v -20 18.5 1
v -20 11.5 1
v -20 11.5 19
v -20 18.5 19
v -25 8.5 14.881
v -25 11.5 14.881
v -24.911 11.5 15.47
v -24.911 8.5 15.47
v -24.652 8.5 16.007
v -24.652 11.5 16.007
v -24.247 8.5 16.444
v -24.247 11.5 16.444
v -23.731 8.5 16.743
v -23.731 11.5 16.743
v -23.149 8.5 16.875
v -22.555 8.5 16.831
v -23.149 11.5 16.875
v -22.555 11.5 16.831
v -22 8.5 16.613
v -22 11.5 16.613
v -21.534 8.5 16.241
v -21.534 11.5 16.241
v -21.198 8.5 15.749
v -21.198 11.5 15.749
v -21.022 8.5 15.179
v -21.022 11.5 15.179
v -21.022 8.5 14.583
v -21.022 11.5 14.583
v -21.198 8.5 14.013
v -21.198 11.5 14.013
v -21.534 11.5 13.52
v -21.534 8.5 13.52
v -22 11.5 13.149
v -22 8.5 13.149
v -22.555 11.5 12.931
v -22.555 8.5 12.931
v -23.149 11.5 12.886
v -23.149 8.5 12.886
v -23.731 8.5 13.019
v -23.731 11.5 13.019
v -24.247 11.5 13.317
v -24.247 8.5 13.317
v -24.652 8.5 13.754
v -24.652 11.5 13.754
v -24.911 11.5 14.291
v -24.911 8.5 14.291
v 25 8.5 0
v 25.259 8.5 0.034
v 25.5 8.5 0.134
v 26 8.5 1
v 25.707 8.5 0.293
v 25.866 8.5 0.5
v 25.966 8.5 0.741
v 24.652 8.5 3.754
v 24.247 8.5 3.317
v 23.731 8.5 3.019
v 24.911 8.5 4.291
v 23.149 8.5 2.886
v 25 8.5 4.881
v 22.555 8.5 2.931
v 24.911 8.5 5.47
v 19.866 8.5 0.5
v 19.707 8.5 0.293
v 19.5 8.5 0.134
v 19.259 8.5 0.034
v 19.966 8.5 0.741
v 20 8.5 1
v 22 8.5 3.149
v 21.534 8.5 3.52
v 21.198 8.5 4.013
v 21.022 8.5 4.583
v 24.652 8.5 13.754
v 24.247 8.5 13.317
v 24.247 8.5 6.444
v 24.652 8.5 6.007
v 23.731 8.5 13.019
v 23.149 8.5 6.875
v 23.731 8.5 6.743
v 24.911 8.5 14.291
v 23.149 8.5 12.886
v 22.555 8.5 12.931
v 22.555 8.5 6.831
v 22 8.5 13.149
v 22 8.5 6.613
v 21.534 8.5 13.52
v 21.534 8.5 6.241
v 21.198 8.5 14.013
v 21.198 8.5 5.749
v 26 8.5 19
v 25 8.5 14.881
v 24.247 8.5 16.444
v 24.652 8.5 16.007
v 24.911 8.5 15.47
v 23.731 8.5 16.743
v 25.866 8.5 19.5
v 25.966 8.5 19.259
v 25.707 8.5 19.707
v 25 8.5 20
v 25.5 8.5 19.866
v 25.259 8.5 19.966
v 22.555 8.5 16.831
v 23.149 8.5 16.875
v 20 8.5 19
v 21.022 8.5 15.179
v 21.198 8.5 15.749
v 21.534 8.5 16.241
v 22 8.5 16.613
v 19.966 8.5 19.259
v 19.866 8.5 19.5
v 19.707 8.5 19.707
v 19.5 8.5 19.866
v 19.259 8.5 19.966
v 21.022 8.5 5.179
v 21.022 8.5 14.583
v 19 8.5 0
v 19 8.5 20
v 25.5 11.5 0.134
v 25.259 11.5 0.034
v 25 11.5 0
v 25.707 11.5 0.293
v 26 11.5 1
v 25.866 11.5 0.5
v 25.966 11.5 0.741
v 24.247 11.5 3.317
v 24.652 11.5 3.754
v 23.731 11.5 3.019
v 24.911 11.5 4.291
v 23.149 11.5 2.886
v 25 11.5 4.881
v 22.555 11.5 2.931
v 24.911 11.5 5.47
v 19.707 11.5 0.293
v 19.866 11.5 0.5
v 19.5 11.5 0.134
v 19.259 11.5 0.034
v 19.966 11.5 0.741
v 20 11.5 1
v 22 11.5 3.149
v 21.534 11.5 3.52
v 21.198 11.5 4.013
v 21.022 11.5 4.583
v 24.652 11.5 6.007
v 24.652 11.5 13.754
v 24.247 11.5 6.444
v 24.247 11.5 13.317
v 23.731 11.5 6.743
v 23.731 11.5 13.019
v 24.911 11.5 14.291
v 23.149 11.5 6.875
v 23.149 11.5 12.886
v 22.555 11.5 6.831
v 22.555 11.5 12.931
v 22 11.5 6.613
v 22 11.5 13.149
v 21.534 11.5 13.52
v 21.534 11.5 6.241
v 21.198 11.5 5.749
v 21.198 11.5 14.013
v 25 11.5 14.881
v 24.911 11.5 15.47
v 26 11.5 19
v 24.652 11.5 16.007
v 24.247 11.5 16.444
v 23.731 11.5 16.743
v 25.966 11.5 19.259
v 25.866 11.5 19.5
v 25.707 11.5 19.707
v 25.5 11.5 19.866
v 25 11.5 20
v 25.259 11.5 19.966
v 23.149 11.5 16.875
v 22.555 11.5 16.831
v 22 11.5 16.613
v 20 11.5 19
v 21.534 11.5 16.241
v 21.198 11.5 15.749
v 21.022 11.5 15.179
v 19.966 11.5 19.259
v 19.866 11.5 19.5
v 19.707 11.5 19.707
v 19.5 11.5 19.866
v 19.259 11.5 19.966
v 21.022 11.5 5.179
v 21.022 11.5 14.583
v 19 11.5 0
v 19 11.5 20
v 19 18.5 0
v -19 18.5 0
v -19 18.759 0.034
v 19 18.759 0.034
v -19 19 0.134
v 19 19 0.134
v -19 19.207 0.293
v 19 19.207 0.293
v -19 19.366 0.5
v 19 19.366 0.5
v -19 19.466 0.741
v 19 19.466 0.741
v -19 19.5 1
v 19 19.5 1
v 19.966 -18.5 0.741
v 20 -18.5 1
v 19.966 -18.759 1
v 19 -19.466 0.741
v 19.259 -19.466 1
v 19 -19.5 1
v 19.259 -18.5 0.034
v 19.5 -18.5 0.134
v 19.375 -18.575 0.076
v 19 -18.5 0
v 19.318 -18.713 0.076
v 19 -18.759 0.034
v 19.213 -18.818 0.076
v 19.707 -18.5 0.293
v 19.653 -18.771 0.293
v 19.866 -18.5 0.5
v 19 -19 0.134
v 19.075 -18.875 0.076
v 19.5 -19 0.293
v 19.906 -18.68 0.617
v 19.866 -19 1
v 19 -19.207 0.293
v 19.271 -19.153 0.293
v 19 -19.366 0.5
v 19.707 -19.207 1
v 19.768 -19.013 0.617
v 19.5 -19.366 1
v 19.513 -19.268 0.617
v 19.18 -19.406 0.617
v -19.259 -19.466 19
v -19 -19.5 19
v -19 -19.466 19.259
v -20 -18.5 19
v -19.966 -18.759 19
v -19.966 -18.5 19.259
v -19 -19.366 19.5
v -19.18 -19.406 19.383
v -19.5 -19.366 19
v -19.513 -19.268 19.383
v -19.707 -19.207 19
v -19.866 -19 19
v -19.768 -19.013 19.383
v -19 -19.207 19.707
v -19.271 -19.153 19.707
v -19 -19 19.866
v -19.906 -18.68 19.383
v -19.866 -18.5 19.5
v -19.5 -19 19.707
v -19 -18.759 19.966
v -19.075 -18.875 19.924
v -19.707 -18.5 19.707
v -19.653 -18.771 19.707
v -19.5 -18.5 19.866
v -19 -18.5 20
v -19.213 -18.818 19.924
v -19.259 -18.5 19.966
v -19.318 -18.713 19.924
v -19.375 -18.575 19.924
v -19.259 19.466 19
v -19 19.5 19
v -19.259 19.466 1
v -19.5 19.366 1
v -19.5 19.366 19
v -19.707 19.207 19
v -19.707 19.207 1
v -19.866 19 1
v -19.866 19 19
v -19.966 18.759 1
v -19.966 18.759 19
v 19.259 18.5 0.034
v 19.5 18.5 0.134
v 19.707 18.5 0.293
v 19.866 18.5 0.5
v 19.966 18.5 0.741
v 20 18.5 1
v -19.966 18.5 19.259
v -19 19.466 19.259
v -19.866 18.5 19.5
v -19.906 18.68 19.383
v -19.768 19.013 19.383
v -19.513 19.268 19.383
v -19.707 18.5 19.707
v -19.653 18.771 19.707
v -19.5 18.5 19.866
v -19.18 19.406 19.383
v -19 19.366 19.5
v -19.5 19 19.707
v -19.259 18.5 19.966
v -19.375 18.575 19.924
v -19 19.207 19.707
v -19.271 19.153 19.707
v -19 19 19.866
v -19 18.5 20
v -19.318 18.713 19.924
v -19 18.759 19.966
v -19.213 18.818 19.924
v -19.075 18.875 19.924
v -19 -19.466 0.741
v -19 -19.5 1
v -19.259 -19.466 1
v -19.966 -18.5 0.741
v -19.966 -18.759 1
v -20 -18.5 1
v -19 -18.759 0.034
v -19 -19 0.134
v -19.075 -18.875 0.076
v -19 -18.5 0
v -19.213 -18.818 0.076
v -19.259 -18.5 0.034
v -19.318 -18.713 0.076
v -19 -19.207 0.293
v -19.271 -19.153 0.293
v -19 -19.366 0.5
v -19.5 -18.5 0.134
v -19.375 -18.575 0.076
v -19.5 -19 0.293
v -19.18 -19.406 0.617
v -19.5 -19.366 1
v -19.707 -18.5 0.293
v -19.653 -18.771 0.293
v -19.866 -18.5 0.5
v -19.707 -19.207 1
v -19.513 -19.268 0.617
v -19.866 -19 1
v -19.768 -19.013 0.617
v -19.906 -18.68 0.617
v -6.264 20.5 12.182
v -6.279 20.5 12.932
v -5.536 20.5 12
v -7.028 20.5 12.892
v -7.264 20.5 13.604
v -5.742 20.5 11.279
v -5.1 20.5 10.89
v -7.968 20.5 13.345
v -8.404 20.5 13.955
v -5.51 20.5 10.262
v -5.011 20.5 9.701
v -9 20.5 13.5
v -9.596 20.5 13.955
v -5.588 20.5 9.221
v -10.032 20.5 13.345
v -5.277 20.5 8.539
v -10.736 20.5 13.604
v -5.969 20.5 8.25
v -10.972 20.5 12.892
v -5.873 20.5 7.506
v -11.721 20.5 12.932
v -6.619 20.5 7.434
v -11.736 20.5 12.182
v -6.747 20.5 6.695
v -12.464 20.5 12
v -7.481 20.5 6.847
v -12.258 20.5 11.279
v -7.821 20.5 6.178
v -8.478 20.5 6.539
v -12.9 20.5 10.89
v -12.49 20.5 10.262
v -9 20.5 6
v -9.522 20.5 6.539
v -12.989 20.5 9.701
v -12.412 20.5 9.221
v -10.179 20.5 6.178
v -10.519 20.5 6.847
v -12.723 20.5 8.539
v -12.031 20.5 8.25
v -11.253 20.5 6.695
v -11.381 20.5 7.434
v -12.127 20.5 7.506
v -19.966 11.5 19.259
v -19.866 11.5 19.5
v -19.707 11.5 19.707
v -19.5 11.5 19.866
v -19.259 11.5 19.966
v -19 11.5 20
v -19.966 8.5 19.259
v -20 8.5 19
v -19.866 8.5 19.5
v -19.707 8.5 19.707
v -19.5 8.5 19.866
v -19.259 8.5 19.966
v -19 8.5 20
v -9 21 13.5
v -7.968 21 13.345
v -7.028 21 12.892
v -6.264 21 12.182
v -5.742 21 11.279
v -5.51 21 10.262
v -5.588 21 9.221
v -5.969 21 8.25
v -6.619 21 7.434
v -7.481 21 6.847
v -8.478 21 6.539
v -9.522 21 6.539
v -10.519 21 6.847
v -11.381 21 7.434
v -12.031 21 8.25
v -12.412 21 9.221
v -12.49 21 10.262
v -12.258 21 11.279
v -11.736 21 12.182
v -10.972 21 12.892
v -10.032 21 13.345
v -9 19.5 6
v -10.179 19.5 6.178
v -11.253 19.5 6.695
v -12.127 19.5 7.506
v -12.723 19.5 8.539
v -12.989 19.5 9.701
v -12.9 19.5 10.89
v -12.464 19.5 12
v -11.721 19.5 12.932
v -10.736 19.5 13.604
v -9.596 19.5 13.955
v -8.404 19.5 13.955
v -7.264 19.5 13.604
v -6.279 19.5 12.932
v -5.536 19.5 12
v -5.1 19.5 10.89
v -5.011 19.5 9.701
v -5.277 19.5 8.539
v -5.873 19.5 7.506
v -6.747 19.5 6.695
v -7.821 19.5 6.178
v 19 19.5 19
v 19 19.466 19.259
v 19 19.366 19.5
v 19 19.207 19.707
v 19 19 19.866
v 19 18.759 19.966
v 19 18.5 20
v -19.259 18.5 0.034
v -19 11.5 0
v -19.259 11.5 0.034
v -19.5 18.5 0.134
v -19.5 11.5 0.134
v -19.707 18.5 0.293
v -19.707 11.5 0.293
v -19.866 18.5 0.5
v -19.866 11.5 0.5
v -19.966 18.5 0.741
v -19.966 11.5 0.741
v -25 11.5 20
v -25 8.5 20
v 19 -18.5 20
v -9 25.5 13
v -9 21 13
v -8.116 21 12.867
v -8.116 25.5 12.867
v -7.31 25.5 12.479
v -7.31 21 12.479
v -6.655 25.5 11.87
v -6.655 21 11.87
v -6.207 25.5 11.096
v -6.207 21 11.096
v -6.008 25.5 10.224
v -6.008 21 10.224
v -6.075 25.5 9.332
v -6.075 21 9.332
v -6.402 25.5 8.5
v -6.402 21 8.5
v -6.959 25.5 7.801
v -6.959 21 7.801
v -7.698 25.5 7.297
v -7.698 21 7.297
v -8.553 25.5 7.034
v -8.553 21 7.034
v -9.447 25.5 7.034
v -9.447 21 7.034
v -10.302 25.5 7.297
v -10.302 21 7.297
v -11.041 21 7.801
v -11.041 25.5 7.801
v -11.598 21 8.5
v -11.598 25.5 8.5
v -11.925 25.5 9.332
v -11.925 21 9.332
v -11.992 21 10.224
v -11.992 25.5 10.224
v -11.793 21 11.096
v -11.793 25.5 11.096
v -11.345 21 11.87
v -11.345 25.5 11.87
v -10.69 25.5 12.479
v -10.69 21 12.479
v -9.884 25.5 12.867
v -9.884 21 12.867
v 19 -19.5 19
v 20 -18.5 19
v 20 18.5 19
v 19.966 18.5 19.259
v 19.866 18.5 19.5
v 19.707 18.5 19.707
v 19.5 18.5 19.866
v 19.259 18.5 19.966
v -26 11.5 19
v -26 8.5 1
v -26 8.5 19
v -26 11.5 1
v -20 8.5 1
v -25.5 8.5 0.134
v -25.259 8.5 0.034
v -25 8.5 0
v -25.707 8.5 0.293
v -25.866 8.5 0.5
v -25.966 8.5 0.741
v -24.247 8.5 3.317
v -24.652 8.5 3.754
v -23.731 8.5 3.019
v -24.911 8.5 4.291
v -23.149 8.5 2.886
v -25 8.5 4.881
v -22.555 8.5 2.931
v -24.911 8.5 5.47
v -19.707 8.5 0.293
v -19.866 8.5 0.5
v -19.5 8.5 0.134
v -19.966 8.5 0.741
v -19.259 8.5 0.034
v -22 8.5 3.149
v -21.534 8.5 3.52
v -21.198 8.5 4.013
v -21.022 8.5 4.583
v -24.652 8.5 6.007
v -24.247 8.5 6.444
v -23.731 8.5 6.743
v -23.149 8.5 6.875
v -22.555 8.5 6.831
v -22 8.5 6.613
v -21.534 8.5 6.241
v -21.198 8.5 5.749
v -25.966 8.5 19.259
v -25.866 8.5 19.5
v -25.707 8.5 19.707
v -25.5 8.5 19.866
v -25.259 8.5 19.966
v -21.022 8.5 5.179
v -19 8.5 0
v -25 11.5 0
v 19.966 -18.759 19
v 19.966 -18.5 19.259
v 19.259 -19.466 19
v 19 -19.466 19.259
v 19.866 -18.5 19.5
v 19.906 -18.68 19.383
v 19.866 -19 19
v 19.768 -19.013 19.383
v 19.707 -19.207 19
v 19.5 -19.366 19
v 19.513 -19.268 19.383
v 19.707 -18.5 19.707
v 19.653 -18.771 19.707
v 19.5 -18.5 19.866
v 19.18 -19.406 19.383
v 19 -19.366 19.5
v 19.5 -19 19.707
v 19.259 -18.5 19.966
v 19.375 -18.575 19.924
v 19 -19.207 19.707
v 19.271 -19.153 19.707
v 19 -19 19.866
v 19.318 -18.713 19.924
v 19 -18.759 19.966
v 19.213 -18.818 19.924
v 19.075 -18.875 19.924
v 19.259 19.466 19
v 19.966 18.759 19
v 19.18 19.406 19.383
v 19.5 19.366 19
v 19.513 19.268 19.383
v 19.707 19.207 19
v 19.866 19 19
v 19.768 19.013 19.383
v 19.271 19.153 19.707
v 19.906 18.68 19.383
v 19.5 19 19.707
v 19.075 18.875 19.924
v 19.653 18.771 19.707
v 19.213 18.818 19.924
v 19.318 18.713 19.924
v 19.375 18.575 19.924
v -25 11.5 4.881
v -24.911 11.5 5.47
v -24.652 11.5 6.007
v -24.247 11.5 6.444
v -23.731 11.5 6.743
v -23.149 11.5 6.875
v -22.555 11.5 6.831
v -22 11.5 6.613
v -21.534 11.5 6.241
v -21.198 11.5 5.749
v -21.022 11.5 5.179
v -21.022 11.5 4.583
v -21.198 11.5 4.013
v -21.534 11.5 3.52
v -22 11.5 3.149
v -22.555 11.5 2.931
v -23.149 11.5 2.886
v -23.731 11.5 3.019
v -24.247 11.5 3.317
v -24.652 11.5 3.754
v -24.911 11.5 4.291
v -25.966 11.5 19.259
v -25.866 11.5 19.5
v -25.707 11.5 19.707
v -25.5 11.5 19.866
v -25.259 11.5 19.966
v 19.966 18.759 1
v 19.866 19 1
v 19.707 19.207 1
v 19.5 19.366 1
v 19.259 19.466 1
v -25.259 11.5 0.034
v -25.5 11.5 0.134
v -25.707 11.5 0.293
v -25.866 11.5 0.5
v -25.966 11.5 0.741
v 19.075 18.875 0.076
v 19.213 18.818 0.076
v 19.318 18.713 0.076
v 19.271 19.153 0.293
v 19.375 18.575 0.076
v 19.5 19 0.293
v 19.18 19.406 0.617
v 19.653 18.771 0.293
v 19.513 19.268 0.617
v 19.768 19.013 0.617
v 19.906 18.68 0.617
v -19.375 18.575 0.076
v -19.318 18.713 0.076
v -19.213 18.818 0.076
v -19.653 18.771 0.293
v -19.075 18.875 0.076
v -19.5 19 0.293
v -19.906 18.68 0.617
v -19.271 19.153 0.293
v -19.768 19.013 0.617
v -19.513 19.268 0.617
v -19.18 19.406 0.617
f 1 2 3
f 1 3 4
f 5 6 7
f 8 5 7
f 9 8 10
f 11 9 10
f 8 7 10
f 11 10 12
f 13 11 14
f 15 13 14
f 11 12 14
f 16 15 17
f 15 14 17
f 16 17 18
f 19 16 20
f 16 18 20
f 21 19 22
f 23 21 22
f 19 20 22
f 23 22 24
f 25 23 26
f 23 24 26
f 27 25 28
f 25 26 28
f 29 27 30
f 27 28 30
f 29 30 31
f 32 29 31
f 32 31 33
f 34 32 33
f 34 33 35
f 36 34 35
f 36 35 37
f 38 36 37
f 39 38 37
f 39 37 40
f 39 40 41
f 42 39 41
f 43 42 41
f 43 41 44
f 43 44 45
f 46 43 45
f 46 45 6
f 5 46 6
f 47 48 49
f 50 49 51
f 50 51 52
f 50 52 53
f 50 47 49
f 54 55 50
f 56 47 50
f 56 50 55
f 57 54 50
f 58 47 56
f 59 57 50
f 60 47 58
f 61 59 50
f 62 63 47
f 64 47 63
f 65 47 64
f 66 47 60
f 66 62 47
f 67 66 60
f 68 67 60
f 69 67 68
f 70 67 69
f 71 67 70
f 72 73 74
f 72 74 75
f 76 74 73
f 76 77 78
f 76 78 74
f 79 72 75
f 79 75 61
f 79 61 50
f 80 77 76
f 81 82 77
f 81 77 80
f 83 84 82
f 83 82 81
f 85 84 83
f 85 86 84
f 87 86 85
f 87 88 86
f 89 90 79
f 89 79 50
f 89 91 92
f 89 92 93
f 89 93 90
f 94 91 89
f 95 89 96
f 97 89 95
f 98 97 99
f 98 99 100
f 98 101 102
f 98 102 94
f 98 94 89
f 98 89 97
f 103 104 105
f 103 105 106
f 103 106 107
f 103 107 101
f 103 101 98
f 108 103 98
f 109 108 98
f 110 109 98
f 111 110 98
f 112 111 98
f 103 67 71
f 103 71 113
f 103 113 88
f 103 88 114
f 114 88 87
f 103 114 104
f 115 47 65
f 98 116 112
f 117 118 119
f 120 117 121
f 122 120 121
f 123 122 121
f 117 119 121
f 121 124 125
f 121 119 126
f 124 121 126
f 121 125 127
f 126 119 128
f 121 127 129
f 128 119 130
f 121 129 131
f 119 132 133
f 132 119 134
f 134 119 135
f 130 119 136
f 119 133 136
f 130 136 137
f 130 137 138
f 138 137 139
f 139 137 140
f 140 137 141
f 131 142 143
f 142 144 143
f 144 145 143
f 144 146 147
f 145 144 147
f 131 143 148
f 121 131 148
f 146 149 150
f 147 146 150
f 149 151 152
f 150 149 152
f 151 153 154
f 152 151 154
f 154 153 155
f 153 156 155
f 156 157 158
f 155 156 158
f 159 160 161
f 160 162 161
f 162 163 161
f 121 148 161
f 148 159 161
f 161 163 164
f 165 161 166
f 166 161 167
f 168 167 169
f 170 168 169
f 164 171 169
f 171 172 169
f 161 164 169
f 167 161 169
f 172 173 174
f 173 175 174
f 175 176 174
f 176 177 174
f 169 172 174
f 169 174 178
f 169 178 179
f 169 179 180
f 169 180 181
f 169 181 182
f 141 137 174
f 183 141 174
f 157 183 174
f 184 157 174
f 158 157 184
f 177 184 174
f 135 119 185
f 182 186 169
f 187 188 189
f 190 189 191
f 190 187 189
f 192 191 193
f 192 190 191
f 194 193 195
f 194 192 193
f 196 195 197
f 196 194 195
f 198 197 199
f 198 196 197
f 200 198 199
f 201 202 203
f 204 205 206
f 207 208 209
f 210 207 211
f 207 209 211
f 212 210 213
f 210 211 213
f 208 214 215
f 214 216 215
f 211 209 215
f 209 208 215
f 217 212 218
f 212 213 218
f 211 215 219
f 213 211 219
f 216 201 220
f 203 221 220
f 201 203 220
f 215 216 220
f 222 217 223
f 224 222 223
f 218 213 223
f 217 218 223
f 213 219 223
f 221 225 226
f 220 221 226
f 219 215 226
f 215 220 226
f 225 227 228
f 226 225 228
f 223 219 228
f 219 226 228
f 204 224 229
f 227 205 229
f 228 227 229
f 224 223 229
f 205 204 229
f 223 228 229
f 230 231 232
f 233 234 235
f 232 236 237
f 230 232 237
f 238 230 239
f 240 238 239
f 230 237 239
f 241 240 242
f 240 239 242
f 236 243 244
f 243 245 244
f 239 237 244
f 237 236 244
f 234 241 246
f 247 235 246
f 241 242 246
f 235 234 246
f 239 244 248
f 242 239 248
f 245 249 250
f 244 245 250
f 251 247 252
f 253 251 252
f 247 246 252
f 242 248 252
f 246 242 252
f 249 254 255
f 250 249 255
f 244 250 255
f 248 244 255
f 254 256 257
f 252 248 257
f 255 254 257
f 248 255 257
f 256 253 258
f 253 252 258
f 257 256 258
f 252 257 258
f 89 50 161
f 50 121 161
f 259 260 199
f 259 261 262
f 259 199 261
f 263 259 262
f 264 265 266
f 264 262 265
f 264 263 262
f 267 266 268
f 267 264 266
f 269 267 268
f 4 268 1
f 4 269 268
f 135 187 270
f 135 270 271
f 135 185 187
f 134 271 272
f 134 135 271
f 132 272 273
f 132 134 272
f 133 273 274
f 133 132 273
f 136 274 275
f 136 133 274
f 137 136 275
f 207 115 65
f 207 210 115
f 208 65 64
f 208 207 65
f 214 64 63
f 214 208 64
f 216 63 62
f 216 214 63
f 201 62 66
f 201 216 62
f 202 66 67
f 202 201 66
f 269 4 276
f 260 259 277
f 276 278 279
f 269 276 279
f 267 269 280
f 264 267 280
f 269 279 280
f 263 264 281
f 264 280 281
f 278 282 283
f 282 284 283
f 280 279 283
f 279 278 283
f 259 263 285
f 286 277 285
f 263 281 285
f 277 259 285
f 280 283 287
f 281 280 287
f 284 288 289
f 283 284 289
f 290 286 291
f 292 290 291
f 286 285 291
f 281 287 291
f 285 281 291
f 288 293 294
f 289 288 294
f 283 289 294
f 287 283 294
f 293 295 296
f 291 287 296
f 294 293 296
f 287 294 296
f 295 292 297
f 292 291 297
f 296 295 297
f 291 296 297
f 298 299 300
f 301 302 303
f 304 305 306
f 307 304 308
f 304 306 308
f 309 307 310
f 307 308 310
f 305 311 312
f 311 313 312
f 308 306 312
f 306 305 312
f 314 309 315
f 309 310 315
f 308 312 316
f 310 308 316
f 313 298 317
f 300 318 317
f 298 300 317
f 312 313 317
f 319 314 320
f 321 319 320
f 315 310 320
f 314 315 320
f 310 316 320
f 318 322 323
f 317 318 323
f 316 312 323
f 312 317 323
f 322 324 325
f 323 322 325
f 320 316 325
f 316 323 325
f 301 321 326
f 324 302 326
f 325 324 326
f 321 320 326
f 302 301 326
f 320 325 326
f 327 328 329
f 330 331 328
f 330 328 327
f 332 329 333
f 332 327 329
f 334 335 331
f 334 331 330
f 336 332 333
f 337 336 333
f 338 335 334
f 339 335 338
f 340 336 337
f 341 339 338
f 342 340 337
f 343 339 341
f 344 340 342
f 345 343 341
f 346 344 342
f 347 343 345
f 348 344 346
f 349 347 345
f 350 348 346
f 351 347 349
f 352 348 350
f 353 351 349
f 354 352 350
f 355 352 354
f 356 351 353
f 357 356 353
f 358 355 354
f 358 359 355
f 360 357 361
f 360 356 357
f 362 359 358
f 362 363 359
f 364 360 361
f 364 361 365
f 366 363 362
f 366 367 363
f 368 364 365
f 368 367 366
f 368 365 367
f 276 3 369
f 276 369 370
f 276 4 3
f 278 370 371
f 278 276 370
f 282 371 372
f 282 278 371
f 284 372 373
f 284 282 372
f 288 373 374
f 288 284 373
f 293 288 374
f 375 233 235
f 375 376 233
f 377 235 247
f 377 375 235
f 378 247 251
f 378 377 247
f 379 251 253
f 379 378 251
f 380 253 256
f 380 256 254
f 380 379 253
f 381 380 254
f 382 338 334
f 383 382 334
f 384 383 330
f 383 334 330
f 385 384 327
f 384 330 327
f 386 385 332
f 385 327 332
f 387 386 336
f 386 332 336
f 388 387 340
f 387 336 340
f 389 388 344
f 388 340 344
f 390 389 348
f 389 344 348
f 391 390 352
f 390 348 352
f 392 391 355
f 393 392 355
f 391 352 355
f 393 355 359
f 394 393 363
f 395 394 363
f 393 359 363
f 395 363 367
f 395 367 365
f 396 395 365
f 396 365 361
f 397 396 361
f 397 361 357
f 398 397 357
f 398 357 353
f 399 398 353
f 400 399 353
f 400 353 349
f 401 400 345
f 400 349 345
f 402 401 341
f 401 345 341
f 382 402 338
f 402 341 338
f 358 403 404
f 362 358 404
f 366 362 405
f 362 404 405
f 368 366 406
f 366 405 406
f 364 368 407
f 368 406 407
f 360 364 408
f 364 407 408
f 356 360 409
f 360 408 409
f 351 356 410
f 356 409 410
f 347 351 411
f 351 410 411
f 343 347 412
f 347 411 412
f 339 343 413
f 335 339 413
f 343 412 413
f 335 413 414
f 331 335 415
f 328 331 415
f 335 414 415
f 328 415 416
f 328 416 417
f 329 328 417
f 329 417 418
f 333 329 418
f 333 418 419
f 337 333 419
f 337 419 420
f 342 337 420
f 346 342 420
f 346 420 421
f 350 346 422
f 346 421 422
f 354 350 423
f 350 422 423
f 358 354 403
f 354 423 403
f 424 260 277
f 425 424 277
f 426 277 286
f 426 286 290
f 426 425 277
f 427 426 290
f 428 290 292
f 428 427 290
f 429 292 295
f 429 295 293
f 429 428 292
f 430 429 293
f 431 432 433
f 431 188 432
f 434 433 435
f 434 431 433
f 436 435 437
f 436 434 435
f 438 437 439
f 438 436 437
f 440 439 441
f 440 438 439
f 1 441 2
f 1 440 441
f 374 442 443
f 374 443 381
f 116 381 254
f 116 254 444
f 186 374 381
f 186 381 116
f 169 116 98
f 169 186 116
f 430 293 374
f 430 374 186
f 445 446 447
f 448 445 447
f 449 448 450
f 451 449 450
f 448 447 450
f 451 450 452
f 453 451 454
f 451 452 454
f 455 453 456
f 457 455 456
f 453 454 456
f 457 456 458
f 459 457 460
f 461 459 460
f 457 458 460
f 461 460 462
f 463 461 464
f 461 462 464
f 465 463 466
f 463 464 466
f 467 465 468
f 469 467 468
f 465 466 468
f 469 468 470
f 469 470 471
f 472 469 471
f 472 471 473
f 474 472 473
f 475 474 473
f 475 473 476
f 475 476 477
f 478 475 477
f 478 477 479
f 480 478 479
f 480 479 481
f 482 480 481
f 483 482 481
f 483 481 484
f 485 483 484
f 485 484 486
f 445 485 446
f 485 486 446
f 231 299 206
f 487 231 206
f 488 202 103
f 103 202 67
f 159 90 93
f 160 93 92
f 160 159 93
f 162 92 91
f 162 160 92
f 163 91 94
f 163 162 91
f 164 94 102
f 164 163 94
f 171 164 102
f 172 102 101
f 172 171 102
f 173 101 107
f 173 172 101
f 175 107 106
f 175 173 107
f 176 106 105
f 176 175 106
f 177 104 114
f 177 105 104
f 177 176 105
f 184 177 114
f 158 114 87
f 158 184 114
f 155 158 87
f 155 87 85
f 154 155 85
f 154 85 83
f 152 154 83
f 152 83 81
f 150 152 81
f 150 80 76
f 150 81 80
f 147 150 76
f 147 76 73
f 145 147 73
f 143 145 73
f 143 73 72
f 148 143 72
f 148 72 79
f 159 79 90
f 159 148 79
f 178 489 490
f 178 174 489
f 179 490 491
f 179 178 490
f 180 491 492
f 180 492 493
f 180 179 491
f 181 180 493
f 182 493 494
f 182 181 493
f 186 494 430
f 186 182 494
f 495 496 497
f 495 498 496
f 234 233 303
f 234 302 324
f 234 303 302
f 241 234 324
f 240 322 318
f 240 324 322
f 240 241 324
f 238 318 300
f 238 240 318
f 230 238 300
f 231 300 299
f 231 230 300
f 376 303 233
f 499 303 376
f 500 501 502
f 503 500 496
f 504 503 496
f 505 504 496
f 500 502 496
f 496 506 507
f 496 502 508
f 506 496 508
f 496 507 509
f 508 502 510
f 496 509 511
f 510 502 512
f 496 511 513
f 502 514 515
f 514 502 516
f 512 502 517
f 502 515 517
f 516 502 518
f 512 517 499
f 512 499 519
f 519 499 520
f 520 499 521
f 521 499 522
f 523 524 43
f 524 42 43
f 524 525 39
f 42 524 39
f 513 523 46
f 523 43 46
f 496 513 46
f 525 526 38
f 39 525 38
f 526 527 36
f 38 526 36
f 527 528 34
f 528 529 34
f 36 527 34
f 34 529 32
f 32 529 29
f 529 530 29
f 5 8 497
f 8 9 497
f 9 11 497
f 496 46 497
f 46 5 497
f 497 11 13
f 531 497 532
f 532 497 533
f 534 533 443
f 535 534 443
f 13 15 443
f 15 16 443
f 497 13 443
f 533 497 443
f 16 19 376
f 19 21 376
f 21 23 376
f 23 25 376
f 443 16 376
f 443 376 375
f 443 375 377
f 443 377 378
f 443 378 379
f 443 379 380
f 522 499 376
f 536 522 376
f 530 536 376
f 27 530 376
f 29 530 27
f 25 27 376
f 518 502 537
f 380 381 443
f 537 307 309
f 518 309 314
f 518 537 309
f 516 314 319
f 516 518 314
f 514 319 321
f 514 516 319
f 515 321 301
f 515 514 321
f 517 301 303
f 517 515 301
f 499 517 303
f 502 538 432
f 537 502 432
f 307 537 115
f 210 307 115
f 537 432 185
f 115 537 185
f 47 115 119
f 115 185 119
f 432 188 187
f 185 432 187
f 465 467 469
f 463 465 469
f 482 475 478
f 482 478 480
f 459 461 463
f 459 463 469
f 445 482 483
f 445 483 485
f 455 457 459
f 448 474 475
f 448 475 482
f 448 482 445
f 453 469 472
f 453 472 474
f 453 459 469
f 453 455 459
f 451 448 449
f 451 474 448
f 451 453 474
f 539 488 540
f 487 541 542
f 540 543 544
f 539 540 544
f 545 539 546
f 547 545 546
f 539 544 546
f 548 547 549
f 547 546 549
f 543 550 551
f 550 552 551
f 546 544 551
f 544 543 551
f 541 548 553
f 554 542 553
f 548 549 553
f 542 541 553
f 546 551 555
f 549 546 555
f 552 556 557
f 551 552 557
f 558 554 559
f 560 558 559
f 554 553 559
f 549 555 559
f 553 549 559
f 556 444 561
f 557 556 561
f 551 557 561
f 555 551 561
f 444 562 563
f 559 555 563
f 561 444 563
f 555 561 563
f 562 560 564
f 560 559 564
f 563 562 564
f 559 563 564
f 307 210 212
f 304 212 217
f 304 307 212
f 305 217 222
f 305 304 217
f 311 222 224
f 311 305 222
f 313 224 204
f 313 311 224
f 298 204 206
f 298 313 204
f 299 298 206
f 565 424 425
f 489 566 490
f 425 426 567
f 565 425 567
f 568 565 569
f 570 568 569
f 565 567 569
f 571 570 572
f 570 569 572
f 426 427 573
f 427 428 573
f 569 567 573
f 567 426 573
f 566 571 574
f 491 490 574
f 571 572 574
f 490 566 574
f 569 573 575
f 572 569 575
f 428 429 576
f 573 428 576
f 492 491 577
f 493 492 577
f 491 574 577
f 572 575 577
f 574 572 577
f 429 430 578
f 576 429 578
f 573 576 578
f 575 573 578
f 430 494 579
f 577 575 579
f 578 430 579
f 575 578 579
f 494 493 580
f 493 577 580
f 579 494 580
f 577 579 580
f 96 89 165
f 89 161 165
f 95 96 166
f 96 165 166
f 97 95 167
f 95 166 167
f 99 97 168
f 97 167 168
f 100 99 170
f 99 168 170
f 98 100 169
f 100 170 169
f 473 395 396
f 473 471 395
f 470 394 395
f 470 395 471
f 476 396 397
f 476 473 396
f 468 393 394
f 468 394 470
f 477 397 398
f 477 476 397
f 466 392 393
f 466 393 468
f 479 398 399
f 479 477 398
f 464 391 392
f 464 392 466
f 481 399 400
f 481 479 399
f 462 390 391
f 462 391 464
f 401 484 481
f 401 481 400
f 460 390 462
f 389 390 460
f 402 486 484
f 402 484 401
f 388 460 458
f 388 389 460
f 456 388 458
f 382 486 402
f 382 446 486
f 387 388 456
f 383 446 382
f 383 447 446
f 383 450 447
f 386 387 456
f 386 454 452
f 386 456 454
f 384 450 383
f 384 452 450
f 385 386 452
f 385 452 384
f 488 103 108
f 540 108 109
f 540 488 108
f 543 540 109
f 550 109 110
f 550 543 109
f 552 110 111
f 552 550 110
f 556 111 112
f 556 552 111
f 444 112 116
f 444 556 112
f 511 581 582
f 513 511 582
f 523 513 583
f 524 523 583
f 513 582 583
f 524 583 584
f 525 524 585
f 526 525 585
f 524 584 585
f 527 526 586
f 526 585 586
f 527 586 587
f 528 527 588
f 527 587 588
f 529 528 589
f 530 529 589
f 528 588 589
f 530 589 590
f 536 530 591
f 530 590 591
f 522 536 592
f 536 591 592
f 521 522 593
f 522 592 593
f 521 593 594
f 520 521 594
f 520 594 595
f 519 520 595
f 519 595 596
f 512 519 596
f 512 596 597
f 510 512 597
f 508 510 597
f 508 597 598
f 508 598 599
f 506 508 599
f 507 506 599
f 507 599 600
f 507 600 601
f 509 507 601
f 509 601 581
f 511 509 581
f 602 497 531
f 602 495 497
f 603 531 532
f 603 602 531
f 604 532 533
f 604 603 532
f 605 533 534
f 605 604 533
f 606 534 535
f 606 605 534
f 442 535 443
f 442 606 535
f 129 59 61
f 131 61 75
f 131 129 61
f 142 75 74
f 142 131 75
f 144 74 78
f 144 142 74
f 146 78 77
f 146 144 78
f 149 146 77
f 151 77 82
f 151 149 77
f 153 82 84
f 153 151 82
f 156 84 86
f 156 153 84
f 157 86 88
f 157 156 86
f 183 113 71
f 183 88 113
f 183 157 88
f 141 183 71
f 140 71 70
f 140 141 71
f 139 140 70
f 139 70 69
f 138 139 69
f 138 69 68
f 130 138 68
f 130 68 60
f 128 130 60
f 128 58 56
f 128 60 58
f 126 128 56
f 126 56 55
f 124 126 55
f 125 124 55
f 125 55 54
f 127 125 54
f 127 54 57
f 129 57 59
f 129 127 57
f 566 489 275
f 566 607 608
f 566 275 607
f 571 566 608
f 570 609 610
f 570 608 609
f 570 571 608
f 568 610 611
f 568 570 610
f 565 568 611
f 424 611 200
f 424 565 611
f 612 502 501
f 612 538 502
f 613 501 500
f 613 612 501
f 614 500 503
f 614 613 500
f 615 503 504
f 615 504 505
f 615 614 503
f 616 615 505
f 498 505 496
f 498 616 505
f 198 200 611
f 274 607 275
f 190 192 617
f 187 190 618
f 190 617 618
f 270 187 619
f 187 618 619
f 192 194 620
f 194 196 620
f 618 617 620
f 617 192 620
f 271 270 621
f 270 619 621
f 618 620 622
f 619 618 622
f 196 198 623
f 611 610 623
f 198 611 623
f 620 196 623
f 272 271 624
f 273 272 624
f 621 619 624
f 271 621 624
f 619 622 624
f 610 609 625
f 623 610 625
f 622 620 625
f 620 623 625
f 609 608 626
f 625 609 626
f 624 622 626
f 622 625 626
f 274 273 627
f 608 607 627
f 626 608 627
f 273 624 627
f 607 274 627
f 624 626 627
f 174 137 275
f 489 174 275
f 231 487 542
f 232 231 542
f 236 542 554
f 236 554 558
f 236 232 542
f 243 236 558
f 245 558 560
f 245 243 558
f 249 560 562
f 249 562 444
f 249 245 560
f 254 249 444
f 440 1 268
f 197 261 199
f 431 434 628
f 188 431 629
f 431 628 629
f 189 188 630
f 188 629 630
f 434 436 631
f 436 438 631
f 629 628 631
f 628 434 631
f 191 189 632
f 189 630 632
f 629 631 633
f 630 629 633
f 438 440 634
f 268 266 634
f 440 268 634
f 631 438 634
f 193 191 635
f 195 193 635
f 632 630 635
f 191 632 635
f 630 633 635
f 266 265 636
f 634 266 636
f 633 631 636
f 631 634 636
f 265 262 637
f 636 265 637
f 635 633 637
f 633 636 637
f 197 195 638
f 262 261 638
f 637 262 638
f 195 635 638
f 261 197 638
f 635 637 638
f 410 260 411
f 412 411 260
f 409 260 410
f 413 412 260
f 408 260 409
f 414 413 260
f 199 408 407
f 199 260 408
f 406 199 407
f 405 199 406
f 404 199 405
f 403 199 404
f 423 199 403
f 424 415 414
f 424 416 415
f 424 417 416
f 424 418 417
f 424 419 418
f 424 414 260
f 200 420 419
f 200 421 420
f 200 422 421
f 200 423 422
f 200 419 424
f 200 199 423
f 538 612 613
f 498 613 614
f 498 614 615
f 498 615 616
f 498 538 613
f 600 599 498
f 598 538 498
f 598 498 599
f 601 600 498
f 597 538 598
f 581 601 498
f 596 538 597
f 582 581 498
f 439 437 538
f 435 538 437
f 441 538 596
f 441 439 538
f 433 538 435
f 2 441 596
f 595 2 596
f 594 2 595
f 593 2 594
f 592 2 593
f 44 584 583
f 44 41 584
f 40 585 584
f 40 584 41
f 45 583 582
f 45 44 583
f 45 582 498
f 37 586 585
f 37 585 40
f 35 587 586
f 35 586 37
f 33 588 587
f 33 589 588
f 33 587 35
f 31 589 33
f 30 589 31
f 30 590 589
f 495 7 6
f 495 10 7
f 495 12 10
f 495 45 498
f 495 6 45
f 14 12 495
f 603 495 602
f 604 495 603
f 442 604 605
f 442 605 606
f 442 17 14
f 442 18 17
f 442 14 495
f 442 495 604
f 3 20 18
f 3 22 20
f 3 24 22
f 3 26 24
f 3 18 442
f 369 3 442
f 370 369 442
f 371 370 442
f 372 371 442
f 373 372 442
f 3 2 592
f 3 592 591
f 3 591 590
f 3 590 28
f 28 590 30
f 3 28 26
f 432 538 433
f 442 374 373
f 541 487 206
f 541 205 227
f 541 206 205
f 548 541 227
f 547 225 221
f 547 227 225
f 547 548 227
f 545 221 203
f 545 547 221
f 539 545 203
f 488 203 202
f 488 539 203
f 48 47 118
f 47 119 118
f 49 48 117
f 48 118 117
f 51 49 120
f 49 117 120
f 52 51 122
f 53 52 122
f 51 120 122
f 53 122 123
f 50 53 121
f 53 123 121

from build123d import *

# Parameters (mm, degrees)
SKETCH_2_W          = 40
SKETCH_2_H          = 39
EXTRUDE_1_DEPTH     = 20
SKETCH_3_R          = 4
EXTRUDE_2_DEPTH     = 1
SKETCH_4_R          = 3.5
EXTRUDE_3_DEPTH     = 0.5
SKETCH_6_R          = 3
EXTRUDE_4_DEPTH     = 4.5
SKETCH_7_W          = 20
SKETCH_7_H          = 3
EXTRUDE_5_DEPTH     = 6
SKETCH_8_R          = 2
CUT_EXTRUDE_1_DEPTH = 6
FILLET_6_R          = 1
FILLET_7_R          = 1
FILLET_8_R          = 1
FILLET_9_R          = 1
FILLET_10_R         = 1
FILLET_11_R         = 1
FILLET_12_R         = 1


with BuildPart() as part:
    # 草图2 → 凸台-拉伸1 (new body)
    with BuildSketch(Plane.XY):
        Rectangle(SKETCH_2_W, SKETCH_2_H)
    extrude(amount=EXTRUDE_1_DEPTH)

    # 草图3 → 凸台-拉伸2 (add)
    with BuildSketch(Plane(origin=(0, 19.5, 0), x_dir=(1, 0, 0), z_dir=(0, 1, 0))):
        with Locations(Location((-9, -10, 0), (0, 0, 90))):
            Circle(SKETCH_3_R)
    extrude(amount=EXTRUDE_2_DEPTH)

    # 草图4 → 凸台-拉伸3 (add)
    with BuildSketch(Plane(origin=(0, 20.5, 0), x_dir=(1, 0, 0), z_dir=(0, 1, 0))):
        with Locations(Location((-9, -10, 0), (0, 0, 270))):
            Circle(SKETCH_4_R)
    extrude(amount=EXTRUDE_3_DEPTH)

    # 草图6 → 凸台-拉伸4 (add)
    with BuildSketch(Plane(origin=(0, 21, 0), x_dir=(1, 0, 0), z_dir=(0, 1, 0))):
        with Locations(Location((-9, -10, 0), (0, 0, 270))):
            Circle(SKETCH_6_R)
    extrude(amount=EXTRUDE_4_DEPTH)

    # 草图7 → 凸台-拉伸5 (add)
    with BuildSketch(Plane.ZY.offset(20)):
        with Locations((10, 10)):
            Rectangle(SKETCH_7_W, SKETCH_7_H)
    extrude_5 = extrude(amount=EXTRUDE_5_DEPTH)

    # 草图8 → 切除-拉伸1 (cut)
    with BuildSketch(Plane(origin=(0, 11.5, 0), x_dir=(1, 0, 0), z_dir=(0, 1, 0))):
        with Locations(Location((-23, -4.880823414, 0), (0, 0, 180))):
            Circle(SKETCH_8_R)
        with Locations(Location((-23, -14.880823414, 0), (0, 0, 180))):
            Circle(SKETCH_8_R)
    cut_extrude_1 = extrude(amount=-CUT_EXTRUDE_1_DEPTH, mode=Mode.SUBTRACT)

    # 镜向3: 凸台-拉伸5, 切除-拉伸1 across plane
    add(extrude_5.mirror(Plane(origin=(0, 0, 0), x_dir=(0, 0, 1), z_dir=(1, 0, 0))))
    add(cut_extrude_1.mirror(Plane(origin=(0, 0, 0), x_dir=(0, 0, 1), z_dir=(1, 0, 0))), mode=Mode.SUBTRACT)

    # 圆角6
    fillet_6_edges = [part.edges().sort_by_distance(p)[0] for p in [
        (-20, -19.5, 10),
    ]]
    fillet(fillet_6_edges, radius=FILLET_6_R)

    # 圆角7
    fillet_7_edges = [part.edges().sort_by_distance(p)[0] for p in [
        (20, -19.5, 10),
    ]]
    fillet(fillet_7_edges, radius=FILLET_7_R)

    # 圆角8
    fillet_8_edges = [part.edges().sort_by_distance(p)[0] for p in [
        (20, 19.5, 10),
    ]]
    fillet(fillet_8_edges, radius=FILLET_8_R)

    # 圆角9
    fillet_9_edges = [part.edges().sort_by_distance(p)[0] for p in [
        (-20, 19.5, 10),
    ]]
    fillet(fillet_9_edges, radius=FILLET_9_R)

    # 圆角10
    fillet_10_edges = [part.edges().sort_by_distance(p)[0] for p in [
        (-26, 10, 20),
        (-26, 10, 0),
    ]]
    fillet(fillet_10_edges, radius=FILLET_10_R)

    # 圆角11
    fillet_11_edges = [part.edges().sort_by_distance(p)[0] for p in [
        (26, 10, 0),
        (26, 10, 20),
    ]]
    fillet(fillet_11_edges, radius=FILLET_11_R)

    # 圆角12
    fillet_12_edges = [part.edges().sort_by_distance(p)[0] for p in [
        (-20, 15, 20),
        (-20, 15, 0),
        (-19.707106781, 19.207106781, 0),
        (-19.707106781, 19.207106781, 20),
        (-20, -5, 0),
        (-20, -5, 20),
        (20, 15, 0),
        (20, 15, 20),
        (0, -19.5, 0),
        (0, -19.5, 20),
        (-19.707106781, -19.207106781, 0),
        (-19.707106781, -19.207106781, 20),
        (20, -5, 20),
        (20, -5, 0),
        (19.707106781, -19.207106781, 0),
        (19.707106781, -19.207106781, 20),
        (0, 19.5, 0),
        (0, 19.5, 20),
        (19.707106781, 19.207106781, 0),
        (19.707106781, 19.207106781, 20),
    ]]
    fillet(fillet_12_edges, radius=FILLET_12_R)


solid = part.part
